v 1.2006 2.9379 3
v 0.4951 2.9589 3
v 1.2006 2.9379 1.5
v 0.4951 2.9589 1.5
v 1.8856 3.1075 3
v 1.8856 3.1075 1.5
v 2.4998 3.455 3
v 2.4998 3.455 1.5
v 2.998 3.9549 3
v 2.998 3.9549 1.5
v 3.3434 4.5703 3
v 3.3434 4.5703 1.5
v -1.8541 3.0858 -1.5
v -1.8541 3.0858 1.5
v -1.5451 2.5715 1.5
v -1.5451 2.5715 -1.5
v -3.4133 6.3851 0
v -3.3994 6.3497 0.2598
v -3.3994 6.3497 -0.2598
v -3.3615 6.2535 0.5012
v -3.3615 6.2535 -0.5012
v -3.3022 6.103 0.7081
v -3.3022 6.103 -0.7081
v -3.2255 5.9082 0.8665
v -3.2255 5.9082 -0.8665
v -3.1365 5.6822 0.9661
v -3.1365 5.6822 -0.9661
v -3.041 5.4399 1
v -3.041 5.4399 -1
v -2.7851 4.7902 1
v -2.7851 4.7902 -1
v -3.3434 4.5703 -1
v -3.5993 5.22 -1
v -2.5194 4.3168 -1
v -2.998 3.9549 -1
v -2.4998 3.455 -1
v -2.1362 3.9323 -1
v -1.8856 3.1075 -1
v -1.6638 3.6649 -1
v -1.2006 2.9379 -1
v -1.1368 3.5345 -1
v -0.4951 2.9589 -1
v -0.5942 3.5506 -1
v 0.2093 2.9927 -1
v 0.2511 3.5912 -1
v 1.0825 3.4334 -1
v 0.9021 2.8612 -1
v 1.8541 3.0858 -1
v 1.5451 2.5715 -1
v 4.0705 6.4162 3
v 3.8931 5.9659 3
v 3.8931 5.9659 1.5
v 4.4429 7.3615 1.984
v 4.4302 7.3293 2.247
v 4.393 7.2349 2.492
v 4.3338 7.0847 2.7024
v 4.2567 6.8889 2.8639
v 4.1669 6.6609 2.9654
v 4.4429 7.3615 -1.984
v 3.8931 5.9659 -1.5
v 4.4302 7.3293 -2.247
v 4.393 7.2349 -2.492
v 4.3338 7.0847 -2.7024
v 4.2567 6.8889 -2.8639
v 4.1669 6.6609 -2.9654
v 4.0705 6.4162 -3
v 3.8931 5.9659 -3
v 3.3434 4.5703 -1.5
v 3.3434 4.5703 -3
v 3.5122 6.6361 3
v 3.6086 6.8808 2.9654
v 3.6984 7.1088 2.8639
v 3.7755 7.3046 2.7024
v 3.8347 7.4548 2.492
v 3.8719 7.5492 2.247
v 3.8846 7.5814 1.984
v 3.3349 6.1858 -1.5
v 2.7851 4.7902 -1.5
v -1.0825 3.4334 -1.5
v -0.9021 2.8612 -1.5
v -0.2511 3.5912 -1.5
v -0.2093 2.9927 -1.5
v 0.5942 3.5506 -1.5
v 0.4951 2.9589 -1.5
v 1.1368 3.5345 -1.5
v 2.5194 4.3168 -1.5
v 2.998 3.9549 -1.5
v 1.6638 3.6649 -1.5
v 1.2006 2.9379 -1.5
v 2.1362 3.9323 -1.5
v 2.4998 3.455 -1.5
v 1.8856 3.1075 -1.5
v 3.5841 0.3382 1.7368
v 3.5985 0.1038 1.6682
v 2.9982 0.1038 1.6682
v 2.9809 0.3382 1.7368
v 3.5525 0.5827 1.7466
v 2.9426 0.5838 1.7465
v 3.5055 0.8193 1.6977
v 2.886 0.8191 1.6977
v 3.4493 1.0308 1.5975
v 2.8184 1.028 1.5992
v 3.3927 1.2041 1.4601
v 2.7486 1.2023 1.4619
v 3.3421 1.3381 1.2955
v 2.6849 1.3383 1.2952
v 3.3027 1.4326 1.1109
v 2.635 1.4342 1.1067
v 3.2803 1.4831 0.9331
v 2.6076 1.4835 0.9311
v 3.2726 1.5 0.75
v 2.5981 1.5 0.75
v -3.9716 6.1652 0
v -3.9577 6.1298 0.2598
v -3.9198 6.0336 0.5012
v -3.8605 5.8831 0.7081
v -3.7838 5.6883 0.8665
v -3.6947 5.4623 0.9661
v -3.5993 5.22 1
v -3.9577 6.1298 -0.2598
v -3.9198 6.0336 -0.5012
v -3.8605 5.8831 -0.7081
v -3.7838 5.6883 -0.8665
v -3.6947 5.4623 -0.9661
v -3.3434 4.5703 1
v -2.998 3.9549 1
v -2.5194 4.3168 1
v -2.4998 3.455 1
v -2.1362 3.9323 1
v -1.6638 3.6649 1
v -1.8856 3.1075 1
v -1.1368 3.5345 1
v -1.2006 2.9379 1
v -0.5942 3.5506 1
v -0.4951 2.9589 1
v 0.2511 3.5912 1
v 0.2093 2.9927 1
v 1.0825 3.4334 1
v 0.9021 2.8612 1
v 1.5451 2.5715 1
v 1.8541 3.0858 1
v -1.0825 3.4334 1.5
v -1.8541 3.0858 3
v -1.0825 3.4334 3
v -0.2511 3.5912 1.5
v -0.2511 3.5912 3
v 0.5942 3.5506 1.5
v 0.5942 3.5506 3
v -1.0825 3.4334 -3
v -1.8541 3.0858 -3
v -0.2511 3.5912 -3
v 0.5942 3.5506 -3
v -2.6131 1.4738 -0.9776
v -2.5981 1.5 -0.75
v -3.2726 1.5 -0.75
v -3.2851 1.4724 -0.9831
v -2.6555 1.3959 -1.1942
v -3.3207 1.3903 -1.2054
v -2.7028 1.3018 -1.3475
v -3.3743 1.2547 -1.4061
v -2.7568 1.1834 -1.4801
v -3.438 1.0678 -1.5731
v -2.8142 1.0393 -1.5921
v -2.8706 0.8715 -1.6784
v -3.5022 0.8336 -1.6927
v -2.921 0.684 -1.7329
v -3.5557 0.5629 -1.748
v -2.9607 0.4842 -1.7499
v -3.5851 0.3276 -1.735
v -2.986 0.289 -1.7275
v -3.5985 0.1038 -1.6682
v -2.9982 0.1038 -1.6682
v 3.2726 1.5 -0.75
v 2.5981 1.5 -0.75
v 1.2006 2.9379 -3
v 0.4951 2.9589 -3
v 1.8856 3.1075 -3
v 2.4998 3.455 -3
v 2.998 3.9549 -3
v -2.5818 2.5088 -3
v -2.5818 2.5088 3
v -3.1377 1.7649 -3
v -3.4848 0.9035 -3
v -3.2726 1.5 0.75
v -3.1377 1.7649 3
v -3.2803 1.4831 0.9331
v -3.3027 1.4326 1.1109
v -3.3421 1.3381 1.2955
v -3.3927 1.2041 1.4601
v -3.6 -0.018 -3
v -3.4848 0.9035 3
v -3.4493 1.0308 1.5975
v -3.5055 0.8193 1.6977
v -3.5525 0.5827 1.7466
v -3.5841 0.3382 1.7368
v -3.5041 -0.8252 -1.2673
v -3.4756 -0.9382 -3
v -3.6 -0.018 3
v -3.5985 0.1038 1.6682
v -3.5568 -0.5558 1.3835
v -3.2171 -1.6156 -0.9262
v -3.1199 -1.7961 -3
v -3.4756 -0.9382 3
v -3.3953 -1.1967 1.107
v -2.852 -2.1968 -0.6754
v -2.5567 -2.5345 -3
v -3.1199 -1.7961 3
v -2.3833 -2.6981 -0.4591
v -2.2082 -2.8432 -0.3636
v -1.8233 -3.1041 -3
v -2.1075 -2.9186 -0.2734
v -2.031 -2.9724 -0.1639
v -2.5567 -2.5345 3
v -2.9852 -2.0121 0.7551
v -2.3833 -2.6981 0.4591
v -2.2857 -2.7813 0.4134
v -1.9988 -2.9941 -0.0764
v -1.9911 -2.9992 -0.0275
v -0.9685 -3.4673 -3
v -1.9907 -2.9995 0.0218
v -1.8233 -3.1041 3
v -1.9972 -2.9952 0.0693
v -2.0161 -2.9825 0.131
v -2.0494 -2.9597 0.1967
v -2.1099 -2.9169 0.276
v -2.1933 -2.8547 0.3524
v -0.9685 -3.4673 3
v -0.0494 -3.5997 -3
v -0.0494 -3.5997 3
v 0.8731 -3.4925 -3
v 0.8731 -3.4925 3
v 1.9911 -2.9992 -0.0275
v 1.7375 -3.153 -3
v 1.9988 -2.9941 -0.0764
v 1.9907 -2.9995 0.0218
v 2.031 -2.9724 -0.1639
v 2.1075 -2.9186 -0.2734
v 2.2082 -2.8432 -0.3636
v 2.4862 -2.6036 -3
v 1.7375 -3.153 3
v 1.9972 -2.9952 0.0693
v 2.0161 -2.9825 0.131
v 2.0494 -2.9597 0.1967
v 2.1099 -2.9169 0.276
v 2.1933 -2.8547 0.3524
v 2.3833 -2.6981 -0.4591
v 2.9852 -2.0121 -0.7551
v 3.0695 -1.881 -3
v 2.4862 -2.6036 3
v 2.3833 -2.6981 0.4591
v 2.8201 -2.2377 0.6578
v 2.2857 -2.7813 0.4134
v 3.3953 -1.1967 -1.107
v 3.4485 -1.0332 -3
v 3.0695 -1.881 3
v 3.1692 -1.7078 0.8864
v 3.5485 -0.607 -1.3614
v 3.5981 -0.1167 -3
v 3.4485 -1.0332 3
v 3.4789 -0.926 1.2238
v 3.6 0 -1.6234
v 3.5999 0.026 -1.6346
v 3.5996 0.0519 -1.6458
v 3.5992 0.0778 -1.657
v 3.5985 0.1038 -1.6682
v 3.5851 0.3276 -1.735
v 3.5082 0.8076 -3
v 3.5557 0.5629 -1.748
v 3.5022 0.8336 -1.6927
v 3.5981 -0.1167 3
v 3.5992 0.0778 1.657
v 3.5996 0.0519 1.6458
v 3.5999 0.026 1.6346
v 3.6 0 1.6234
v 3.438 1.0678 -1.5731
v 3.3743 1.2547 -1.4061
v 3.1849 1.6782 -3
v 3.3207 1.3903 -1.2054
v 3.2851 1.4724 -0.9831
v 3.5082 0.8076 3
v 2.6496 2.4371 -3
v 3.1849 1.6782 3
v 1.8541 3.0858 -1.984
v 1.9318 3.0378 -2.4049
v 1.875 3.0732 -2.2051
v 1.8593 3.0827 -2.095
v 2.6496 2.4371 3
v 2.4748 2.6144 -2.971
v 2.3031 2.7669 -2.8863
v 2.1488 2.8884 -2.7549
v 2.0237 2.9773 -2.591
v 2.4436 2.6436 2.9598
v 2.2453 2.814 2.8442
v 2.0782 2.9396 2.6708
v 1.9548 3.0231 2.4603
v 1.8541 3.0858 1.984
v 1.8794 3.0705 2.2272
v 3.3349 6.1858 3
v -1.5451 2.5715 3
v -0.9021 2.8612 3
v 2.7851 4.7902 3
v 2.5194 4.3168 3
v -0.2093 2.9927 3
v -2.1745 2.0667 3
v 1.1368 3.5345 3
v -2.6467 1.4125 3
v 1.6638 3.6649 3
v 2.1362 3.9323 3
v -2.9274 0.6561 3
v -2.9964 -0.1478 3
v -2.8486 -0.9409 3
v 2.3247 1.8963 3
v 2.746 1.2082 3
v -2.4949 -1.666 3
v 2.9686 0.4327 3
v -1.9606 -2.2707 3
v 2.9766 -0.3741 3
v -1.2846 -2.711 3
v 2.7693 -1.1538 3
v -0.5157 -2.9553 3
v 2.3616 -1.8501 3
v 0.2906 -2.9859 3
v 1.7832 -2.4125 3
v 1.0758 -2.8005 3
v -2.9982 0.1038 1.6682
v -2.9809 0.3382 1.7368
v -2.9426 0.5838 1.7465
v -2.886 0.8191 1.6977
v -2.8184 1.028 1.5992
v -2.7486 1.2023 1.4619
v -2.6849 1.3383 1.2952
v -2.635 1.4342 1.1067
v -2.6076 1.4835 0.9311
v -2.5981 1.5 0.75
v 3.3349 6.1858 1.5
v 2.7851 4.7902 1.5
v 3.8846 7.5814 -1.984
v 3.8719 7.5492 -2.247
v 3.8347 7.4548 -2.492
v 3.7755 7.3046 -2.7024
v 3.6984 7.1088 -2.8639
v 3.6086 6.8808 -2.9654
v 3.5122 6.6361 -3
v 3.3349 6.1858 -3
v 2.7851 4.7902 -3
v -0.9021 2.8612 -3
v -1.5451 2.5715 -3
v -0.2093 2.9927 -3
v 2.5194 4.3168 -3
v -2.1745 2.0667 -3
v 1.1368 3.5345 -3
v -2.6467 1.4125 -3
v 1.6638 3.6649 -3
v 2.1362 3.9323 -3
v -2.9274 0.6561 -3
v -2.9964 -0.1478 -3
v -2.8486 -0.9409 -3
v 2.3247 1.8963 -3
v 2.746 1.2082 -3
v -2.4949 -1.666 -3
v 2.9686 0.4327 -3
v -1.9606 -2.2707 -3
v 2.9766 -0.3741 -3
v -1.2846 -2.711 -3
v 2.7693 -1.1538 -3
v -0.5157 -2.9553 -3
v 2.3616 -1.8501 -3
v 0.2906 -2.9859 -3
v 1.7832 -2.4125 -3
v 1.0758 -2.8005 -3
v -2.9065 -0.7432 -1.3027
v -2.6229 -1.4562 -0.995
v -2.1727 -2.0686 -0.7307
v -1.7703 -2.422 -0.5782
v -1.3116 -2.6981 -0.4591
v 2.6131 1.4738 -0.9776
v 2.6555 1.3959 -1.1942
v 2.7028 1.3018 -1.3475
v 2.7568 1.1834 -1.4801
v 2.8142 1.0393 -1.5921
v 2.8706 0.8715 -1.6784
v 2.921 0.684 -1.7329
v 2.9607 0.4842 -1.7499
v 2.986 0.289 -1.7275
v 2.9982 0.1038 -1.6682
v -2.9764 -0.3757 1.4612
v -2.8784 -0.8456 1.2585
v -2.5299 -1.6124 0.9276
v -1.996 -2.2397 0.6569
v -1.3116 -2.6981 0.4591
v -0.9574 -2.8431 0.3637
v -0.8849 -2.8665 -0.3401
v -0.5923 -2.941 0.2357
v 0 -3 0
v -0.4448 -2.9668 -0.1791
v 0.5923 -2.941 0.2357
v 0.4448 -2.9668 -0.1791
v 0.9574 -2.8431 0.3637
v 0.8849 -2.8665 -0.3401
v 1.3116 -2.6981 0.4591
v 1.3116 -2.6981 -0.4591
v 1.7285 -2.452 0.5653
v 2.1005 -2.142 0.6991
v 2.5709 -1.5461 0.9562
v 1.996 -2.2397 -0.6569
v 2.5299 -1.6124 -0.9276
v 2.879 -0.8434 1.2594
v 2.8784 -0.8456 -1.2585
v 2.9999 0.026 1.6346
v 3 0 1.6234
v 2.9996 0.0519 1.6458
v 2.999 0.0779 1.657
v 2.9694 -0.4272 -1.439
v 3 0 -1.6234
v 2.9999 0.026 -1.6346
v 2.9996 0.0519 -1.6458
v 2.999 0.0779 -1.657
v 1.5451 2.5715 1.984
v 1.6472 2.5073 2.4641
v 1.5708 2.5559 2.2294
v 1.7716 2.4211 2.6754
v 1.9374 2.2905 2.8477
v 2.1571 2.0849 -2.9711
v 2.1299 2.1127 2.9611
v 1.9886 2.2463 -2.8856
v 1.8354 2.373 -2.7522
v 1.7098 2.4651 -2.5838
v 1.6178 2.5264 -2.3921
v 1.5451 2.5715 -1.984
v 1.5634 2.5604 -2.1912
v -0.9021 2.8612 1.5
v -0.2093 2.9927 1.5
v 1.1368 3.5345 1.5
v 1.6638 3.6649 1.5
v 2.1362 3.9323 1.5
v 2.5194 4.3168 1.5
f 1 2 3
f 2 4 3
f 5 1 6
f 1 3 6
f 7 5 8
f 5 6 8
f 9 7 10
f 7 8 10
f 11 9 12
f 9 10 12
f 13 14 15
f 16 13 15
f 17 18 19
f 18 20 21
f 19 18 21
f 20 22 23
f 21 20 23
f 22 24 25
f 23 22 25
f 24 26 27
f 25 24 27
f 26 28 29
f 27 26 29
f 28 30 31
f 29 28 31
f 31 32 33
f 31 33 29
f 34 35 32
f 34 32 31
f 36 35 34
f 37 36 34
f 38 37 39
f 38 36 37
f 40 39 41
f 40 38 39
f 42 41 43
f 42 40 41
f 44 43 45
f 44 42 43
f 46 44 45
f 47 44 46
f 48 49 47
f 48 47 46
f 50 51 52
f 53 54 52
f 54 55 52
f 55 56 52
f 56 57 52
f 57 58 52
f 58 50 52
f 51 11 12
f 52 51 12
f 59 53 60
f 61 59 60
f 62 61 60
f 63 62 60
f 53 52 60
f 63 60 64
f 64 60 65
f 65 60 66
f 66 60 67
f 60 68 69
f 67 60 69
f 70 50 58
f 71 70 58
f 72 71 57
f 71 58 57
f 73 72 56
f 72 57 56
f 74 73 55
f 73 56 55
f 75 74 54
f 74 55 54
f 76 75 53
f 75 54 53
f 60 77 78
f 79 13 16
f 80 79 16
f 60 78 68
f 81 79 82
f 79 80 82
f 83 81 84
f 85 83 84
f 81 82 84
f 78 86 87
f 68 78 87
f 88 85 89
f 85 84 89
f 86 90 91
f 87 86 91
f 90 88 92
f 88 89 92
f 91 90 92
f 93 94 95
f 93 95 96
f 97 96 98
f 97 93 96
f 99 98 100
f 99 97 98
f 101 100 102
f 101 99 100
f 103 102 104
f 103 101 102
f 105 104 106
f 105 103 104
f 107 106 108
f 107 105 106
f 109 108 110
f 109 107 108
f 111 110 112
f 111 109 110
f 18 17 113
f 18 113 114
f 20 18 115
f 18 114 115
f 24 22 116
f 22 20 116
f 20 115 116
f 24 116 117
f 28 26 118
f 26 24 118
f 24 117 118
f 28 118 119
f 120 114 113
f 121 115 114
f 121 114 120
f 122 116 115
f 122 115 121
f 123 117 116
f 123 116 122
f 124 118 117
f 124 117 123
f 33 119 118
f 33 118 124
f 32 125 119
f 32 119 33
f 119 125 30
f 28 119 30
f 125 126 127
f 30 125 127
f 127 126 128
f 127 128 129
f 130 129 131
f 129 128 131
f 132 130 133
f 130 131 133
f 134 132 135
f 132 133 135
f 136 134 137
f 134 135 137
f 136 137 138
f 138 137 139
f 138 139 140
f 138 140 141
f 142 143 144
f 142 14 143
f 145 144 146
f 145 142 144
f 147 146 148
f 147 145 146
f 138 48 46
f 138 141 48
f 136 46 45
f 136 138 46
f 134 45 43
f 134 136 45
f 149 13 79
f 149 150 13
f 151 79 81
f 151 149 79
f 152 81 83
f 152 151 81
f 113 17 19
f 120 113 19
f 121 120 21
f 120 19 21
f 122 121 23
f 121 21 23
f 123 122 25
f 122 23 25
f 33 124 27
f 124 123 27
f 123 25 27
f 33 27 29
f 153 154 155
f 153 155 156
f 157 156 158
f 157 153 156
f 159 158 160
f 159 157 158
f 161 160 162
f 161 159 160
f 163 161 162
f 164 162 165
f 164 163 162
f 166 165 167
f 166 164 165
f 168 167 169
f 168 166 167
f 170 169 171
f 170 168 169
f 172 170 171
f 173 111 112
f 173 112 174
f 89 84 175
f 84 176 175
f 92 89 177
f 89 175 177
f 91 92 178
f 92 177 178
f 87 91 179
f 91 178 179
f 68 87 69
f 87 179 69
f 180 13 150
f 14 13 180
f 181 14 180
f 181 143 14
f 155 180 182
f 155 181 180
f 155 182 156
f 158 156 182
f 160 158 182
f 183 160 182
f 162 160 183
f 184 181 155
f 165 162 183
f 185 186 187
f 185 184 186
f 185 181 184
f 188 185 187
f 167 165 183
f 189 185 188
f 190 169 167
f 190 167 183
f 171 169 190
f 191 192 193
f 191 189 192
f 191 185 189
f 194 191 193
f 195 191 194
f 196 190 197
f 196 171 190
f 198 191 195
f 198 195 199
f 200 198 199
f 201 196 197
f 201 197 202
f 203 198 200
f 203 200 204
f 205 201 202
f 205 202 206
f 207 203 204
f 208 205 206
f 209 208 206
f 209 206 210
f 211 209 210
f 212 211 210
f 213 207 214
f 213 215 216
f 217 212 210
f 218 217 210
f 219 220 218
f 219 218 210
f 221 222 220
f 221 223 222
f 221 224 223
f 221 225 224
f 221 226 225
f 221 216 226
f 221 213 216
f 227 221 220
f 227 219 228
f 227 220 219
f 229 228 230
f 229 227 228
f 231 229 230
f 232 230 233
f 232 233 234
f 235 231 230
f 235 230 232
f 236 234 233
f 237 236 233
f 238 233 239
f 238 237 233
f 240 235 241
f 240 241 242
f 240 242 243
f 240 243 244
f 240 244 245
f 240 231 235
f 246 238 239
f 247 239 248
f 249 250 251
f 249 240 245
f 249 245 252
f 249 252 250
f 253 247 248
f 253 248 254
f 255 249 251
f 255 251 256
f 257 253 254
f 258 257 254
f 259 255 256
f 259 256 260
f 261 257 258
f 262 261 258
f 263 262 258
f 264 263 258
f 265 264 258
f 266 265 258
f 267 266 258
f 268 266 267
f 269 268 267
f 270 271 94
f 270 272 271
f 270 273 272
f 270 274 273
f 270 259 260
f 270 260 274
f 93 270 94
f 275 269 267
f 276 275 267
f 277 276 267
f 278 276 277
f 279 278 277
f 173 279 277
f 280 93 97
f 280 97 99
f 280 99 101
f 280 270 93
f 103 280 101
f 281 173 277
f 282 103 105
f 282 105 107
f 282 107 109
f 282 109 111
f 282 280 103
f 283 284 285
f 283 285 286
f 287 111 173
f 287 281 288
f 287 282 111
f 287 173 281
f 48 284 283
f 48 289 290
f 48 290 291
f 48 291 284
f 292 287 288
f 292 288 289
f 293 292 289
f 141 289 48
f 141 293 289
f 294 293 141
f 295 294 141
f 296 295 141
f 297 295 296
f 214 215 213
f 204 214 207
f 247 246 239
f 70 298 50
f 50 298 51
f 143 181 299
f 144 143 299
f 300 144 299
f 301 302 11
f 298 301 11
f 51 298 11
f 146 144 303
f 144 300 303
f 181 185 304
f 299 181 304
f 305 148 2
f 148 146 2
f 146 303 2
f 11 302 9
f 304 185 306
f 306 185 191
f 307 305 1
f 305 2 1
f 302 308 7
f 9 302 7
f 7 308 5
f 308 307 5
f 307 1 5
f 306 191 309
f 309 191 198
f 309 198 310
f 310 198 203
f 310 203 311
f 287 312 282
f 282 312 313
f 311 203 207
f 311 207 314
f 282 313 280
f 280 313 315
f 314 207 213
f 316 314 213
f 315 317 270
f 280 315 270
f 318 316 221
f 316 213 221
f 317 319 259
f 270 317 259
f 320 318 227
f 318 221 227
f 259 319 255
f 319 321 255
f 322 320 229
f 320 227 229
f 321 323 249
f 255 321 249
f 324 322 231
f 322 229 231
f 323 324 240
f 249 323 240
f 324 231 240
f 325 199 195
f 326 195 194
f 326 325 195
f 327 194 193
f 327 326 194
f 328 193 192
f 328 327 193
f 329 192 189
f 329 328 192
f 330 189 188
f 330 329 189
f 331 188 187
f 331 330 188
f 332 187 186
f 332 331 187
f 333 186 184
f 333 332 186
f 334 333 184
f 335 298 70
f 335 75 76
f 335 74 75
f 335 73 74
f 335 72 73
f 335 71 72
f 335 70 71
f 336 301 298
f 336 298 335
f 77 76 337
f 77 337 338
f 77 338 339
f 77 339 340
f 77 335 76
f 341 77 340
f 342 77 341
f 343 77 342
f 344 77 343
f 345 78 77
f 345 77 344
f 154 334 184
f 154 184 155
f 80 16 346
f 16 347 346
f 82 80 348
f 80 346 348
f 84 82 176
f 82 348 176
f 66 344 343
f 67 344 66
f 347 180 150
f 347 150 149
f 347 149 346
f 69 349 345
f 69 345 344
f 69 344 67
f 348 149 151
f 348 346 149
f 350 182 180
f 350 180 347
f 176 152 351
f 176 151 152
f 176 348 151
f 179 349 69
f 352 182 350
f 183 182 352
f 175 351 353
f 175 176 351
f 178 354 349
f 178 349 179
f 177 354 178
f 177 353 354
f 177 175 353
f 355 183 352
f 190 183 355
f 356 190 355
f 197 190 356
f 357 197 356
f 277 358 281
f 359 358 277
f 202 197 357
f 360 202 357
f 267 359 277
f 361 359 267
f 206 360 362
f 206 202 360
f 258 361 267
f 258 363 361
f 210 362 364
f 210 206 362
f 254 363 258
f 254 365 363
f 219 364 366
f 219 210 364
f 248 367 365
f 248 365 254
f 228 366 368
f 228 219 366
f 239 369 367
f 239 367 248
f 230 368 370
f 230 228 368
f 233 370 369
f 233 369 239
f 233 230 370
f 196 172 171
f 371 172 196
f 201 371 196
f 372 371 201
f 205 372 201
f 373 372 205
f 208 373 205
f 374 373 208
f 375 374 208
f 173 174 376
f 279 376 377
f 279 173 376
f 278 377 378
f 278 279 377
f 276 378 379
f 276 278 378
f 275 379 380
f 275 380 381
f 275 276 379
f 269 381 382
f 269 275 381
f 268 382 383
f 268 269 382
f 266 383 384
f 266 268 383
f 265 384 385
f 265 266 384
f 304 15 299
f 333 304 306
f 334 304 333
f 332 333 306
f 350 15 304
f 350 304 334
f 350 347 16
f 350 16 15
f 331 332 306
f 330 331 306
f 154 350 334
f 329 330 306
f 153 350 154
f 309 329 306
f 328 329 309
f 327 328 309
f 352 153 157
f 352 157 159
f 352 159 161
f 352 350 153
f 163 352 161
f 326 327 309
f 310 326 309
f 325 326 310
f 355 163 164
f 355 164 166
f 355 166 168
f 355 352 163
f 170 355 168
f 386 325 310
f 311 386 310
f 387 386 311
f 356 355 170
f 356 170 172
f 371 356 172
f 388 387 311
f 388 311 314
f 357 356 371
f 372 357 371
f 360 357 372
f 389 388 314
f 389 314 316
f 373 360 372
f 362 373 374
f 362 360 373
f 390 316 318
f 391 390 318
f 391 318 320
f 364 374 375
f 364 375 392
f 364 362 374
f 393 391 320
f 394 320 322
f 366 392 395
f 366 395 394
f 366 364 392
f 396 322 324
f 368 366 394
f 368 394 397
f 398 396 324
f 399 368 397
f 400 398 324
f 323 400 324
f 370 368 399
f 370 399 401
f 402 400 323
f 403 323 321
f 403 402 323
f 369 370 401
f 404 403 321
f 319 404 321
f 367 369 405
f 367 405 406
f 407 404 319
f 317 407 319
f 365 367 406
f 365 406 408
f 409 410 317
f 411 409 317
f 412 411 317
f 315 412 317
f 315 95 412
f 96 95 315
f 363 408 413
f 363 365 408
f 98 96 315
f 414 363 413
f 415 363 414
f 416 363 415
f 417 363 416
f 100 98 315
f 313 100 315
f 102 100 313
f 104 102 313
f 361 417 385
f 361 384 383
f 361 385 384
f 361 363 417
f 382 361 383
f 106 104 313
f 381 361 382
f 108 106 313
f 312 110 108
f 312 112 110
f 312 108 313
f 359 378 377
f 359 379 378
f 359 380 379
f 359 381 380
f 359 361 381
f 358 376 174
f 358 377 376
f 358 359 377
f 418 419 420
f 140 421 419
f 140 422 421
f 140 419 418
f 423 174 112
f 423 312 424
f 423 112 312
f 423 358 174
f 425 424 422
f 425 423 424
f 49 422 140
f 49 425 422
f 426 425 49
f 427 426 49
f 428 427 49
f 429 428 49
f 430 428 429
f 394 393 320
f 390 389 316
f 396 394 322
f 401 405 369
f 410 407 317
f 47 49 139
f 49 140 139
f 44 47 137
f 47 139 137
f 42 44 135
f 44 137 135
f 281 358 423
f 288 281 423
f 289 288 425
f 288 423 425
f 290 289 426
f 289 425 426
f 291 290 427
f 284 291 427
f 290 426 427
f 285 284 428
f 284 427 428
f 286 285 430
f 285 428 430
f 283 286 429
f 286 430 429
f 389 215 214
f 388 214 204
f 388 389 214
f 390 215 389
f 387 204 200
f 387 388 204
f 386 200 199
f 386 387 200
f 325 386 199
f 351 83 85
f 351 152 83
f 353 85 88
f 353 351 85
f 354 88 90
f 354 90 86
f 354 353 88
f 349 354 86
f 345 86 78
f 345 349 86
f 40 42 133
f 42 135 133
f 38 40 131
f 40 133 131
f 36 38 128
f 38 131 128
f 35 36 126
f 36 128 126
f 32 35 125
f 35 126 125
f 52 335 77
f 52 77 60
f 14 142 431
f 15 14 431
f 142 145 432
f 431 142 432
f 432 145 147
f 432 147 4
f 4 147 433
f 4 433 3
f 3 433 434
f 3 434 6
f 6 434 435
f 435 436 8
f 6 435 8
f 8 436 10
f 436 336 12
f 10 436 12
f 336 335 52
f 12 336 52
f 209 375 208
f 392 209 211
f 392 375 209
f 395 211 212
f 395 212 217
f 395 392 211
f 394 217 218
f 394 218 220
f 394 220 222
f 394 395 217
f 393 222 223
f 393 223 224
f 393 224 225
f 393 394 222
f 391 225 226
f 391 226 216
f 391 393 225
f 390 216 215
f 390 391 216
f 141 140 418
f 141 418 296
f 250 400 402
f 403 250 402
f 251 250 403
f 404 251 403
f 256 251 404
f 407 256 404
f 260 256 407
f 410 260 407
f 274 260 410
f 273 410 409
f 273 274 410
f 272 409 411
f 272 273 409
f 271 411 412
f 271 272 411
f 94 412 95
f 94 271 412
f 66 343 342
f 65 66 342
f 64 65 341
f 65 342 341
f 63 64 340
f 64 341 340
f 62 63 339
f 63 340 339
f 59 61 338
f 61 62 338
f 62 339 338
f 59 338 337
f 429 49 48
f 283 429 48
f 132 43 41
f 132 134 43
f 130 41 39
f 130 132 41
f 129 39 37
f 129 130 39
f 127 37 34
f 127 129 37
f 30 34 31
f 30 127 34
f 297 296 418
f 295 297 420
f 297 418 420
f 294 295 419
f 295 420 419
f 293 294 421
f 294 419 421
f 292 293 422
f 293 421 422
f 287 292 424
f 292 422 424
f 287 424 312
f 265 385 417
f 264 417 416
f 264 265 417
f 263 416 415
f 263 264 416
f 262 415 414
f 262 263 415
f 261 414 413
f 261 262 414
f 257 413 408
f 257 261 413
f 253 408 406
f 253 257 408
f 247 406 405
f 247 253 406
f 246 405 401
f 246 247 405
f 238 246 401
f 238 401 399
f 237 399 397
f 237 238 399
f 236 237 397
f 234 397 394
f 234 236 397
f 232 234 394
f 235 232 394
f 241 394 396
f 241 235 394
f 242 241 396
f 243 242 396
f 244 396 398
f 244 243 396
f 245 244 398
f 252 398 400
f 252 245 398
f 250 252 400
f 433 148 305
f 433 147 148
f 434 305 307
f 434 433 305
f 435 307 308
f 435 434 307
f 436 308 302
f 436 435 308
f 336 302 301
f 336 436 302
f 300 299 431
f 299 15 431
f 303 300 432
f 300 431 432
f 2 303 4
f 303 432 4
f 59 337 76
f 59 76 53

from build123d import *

# Parameters (mm, degrees)
CYLINDER_SKETCH_R               = 3.6
CYLINDER_SKETCH_R_2             = 3
CYLINDER_EXTRUDE_DEPTH          = 3
CUT_SIDE_SLOTS_DEPTH            = 12.7
CUT_SLOT_IN_TOP_DEPTH           = 8.868926397
FEMALE_BASE_SKETCH_W            = 1.5
FEMALE_BASE_SKETCH_H            = 0.6
FEMALE_BASE_ANGLE               = 40.5
FEMALE_TRANSITION_SKETCH_W      = 1.5
FEMALE_TRANSITION_SKETCH_H      = 0.6
FEMALE_TRANSITION_REVOLVE_ANGLE = 78
FEMALE_LEVER_SKETCH_W           = 0.6
FEMALE_LEVER_SKETCH_H           = 1.5
FEMALE_LEVER_EXTRUDE_DEPTH      = 1.5
FEMALE_TOP_SKETCH_W             = 0.6
FEMALE_TOP_SKETCH_H             = 6
FEMALE_TOP_EXTRUDE_DEPTH        = 1.5
MALE_BASE_SKETCH_W              = 2
MALE_BASE_SKETCH_H              = 0.6
MALE_BASE_ANGLE                 = 40.5
MALE_TRANSITION_SKETCH_W        = 2
MALE_TRANSITION_SKETCH_H        = 0.6
MALE_TRANSITION_REVOLVE_ANGLE   = 78
MALE_LEVER_SKETCH_W             = 0.6
MALE_LEVER_SKETCH_H             = 2
MALE_LEVER_EXTRUDE_DEPTH        = 1.714285714
FILLETS_R                       = 1.016


with BuildPart() as part:
    # Cylinder Sketch → Cylinder Extrude (new, symmetric)
    with BuildSketch(Plane.XY):
        Circle(CYLINDER_SKETCH_R)
        Circle(CYLINDER_SKETCH_R_2, mode=Mode.SUBTRACT)
    extrude(amount=CYLINDER_EXTRUDE_DEPTH, both=True)

    # Side Slot Sketch → Cut Side Slots (cut, symmetric)
    with BuildSketch(Plane(origin=(0, 0, 0), x_dir=(0, 0, -1), z_dir=(1, 0, 0))):
        with BuildLine():
            Line((-0.75, 1.5), (0.75, 1.5))
            ThreePointArc((0.75, 1.5), (1.585525874, 1.049451102), (1.668161225, 0.103793027))
            Line((1.668161225, 0.103793027), (0.459080612, -2.698103486))
            ThreePointArc((0.459080612, -2.698103486), (0, -3), (-0.459080612, -2.698103486))
            Line((-0.459080612, -2.698103486), (-1.668161225, 0.103793027))
            ThreePointArc((-1.668161225, 0.103793027), (-1.585525874, 1.049451102), (-0.75, 1.5))
        make_face()
    extrude(amount=CUT_SIDE_SLOTS_DEPTH, both=True, mode=Mode.SUBTRACT)

    # Top Slot Sketch → Cut Slot in Top (cut, through all)
    with BuildSketch(Plane.XY.offset(3)):
        Polygon((-2.163098228, 3.6), (0, 0), (2.163098228, 3.6), align=None)
    extrude(amount=-CUT_SLOT_IN_TOP_DEPTH, mode=Mode.SUBTRACT)

    # Female Base Sketch → Female Base (revolve)
    with BuildSketch(Plane(origin=(0, 0, 0), x_dir=(0, 0, -1), z_dir=(0.8571673007021136, 0.515038074910052, 0))):
        with Locations((-2.25, 3.3)):
            Rectangle(FEMALE_BASE_SKETCH_W, FEMALE_BASE_SKETCH_H)
        with Locations((2.25, 3.3)):
            Rectangle(FEMALE_BASE_SKETCH_W, FEMALE_BASE_SKETCH_H)
    revolve(axis=Axis((0, 0, 0), (0, 0, -1)), revolution_arc=FEMALE_BASE_ANGLE)

    # Female Transition Sketch → Female Transition Revolve (revolve)
    with BuildSketch(Plane(origin=(0, 0, 0), x_dir=(0, 0, -1), z_dir=(0.9862856015372308, -0.16504760586068196, 0))):
        with Locations((2.25, 3.3)):
            Rectangle(FEMALE_TRANSITION_SKETCH_W, FEMALE_TRANSITION_SKETCH_H)
        with Locations((-2.25, 3.3)):
            Rectangle(FEMALE_TRANSITION_SKETCH_W, FEMALE_TRANSITION_SKETCH_H)
    revolve(axis=Axis((0.924266593, 5.523199369, 1.5), (0, 0, 1)), revolution_arc=FEMALE_TRANSITION_REVOLVE_ANGLE)

    # Female Lever Sketch → Female Lever Extrude (add)
    with BuildSketch(Plane(origin=(2.007556855, 5.096479986, 0), x_dir=(0.9304175679820241, -0.3665012267242986, 0), z_dir=(0.3665012267242986, 0.9304175679820241, 0))):
        with Locations((1.135694531, 2.25)):
            Rectangle(FEMALE_LEVER_SKETCH_W, FEMALE_LEVER_SKETCH_H)
        with Locations((1.135694531, -2.25)):
            Rectangle(FEMALE_LEVER_SKETCH_W, FEMALE_LEVER_SKETCH_H)
    extrude(amount=FEMALE_LEVER_EXTRUDE_DEPTH)

    # Female Top Sketch → Female Top Extrude (add)
    with BuildSketch(Plane(origin=(2.557308695, 6.492106338, 0), x_dir=(0.930417567982024, -0.3665012267242986, 0), z_dir=(0.3665012267242986, 0.9304175679820241, 0))):
        with Locations((1.135694531, 0)):
            Rectangle(FEMALE_TOP_SKETCH_W, FEMALE_TOP_SKETCH_H)
    extrude(amount=FEMALE_TOP_EXTRUDE_DEPTH)

    # Male Base Sketch → Male Base (revolve)
    with BuildSketch(Plane(origin=(0, 0, 0), x_dir=(0, 0, 1), z_dir=(-0.8571673007021136, 0.515038074910052, 0))):
        with Locations((0, 3.3)):
            Rectangle(MALE_BASE_SKETCH_W, MALE_BASE_SKETCH_H)
    revolve(axis=Axis((0, 0, 0), (0, 0, 1)), revolution_arc=MALE_BASE_ANGLE)

    # Male Transition Sketch → Male Transition Revolve (revolve)
    with BuildSketch(Plane(origin=(0, 0, 0), x_dir=(0, 0, 1), z_dir=(-0.9862856015372308, -0.16504760586068182, 0))):
        with Locations((0, 3.3)):
            Rectangle(MALE_TRANSITION_SKETCH_W, MALE_TRANSITION_SKETCH_H)
    revolve(axis=Axis((-0.924266593, 5.523199369, -1), (0, 0, -1)), revolution_arc=MALE_TRANSITION_REVOLVE_ANGLE)

    # Male Lever Sketch → Male Lever Extrude (add)
    with BuildSketch(Plane(origin=(-2.007556855, 5.096479986, 0), x_dir=(0.9304175679820241, 0.3665012267242986, 0), z_dir=(-0.3665012267242986, 0.9304175679820241, 0))):
        with Locations((-1.135694531, 0)):
            Rectangle(MALE_LEVER_SKETCH_W, MALE_LEVER_SKETCH_H)
    extrude(amount=MALE_LEVER_EXTRUDE_DEPTH)

    # Fillets
    # the kernel refuses this fillet: 1.016 mm, written as the material it takes off along each edge
    with BuildSketch(Plane(origin=(0.236917514, 0.394296958, -3), x_dir=(0.8571673007021136, -0.5150380749100519, 0), z_dir=(0.515038074910052, 0.8571673007021137, 0))) as fillets_piece_1_section:
        with BuildLine():
            CenterArc((FILLETS_R, -FILLETS_R), FILLETS_R, 90, 90)
            Line((0, -FILLETS_R), (0, 0))
            Line((0, 0), (FILLETS_R, 0))
        make_face()
    fillets_piece_1 = extrude(amount=5.68, mode=Mode.PRIVATE)
    fillets_piece_1 = fillets_piece_1 & Plane(origin=(0, 0, -2.773460416), x_dir=(1, 0, 0), z_dir=(0, 0, 1)) * Cylinder(3.6, 16, mode=Mode.PRIVATE)
    add(fillets_piece_1, mode=Mode.SUBTRACT)
    with BuildSketch(Plane(origin=(0.236917514, 0.394296958, 3), x_dir=(0, 0, -1), z_dir=(0.515038074910052, 0.8571673007021137, 0))) as fillets_piece_2_section:
        with BuildLine():
            CenterArc((FILLETS_R, -FILLETS_R), FILLETS_R, 90, 90)
            Line((0, -FILLETS_R), (0, 0))
            Line((0, 0), (FILLETS_R, 0))
        make_face()
    fillets_piece_2 = extrude(amount=5.68, mode=Mode.PRIVATE)
    fillets_piece_2 = fillets_piece_2 & Plane(origin=(0, 0, 2.773461153), x_dir=(1, 0, 0), z_dir=(0, 0, 1)) * Cylinder(3.6, 16, mode=Mode.PRIVATE)
    add(fillets_piece_2, mode=Mode.SUBTRACT)
    with BuildSketch(Plane(origin=(-6.334900709, 5.234384608, 1), x_dir=(0.3665012267242986, -0.930417567982024, 0), z_dir=(0.9304175679820241, 0.3665012267242986, 0)), Plane(origin=(-1.050128923, 7.316111576, -1), x_dir=(0.3665012267242985, -0.930417567982024, 0), z_dir=(-0.9304175679820241, -0.3665012267242986, 0))) as fillets_piece_3:
        with BuildLine():
            CenterArc((FILLETS_R, FILLETS_R), FILLETS_R, 180, 90)
            Line((0, FILLETS_R), (0, 0))
            Line((0, 0), (FILLETS_R, 0))
        make_face()
    extrude(amount=5.68, mode=Mode.SUBTRACT)
    with BuildSketch(Plane(origin=(1.521344786, 8.512362735, -3), x_dir=(-0.3665012267242986, -0.930417567982024, 0), z_dir=(0.9304175679820241, -0.3665012267242986, 0)), Plane(origin=(6.806116572, 6.430635767, 3), x_dir=(-0.3665012267242985, -0.930417567982024, 0), z_dir=(-0.9304175679820241, 0.3665012267242986, 0))) as fillets_piece_4:
        with BuildLine():
            CenterArc((FILLETS_R, -FILLETS_R), FILLETS_R, 90, 90)
            Line((0, -FILLETS_R), (0, 0))
            Line((0, 0), (FILLETS_R, 0))
        make_face()
    extrude(amount=5.68, mode=Mode.SUBTRACT)


solid = part.part
